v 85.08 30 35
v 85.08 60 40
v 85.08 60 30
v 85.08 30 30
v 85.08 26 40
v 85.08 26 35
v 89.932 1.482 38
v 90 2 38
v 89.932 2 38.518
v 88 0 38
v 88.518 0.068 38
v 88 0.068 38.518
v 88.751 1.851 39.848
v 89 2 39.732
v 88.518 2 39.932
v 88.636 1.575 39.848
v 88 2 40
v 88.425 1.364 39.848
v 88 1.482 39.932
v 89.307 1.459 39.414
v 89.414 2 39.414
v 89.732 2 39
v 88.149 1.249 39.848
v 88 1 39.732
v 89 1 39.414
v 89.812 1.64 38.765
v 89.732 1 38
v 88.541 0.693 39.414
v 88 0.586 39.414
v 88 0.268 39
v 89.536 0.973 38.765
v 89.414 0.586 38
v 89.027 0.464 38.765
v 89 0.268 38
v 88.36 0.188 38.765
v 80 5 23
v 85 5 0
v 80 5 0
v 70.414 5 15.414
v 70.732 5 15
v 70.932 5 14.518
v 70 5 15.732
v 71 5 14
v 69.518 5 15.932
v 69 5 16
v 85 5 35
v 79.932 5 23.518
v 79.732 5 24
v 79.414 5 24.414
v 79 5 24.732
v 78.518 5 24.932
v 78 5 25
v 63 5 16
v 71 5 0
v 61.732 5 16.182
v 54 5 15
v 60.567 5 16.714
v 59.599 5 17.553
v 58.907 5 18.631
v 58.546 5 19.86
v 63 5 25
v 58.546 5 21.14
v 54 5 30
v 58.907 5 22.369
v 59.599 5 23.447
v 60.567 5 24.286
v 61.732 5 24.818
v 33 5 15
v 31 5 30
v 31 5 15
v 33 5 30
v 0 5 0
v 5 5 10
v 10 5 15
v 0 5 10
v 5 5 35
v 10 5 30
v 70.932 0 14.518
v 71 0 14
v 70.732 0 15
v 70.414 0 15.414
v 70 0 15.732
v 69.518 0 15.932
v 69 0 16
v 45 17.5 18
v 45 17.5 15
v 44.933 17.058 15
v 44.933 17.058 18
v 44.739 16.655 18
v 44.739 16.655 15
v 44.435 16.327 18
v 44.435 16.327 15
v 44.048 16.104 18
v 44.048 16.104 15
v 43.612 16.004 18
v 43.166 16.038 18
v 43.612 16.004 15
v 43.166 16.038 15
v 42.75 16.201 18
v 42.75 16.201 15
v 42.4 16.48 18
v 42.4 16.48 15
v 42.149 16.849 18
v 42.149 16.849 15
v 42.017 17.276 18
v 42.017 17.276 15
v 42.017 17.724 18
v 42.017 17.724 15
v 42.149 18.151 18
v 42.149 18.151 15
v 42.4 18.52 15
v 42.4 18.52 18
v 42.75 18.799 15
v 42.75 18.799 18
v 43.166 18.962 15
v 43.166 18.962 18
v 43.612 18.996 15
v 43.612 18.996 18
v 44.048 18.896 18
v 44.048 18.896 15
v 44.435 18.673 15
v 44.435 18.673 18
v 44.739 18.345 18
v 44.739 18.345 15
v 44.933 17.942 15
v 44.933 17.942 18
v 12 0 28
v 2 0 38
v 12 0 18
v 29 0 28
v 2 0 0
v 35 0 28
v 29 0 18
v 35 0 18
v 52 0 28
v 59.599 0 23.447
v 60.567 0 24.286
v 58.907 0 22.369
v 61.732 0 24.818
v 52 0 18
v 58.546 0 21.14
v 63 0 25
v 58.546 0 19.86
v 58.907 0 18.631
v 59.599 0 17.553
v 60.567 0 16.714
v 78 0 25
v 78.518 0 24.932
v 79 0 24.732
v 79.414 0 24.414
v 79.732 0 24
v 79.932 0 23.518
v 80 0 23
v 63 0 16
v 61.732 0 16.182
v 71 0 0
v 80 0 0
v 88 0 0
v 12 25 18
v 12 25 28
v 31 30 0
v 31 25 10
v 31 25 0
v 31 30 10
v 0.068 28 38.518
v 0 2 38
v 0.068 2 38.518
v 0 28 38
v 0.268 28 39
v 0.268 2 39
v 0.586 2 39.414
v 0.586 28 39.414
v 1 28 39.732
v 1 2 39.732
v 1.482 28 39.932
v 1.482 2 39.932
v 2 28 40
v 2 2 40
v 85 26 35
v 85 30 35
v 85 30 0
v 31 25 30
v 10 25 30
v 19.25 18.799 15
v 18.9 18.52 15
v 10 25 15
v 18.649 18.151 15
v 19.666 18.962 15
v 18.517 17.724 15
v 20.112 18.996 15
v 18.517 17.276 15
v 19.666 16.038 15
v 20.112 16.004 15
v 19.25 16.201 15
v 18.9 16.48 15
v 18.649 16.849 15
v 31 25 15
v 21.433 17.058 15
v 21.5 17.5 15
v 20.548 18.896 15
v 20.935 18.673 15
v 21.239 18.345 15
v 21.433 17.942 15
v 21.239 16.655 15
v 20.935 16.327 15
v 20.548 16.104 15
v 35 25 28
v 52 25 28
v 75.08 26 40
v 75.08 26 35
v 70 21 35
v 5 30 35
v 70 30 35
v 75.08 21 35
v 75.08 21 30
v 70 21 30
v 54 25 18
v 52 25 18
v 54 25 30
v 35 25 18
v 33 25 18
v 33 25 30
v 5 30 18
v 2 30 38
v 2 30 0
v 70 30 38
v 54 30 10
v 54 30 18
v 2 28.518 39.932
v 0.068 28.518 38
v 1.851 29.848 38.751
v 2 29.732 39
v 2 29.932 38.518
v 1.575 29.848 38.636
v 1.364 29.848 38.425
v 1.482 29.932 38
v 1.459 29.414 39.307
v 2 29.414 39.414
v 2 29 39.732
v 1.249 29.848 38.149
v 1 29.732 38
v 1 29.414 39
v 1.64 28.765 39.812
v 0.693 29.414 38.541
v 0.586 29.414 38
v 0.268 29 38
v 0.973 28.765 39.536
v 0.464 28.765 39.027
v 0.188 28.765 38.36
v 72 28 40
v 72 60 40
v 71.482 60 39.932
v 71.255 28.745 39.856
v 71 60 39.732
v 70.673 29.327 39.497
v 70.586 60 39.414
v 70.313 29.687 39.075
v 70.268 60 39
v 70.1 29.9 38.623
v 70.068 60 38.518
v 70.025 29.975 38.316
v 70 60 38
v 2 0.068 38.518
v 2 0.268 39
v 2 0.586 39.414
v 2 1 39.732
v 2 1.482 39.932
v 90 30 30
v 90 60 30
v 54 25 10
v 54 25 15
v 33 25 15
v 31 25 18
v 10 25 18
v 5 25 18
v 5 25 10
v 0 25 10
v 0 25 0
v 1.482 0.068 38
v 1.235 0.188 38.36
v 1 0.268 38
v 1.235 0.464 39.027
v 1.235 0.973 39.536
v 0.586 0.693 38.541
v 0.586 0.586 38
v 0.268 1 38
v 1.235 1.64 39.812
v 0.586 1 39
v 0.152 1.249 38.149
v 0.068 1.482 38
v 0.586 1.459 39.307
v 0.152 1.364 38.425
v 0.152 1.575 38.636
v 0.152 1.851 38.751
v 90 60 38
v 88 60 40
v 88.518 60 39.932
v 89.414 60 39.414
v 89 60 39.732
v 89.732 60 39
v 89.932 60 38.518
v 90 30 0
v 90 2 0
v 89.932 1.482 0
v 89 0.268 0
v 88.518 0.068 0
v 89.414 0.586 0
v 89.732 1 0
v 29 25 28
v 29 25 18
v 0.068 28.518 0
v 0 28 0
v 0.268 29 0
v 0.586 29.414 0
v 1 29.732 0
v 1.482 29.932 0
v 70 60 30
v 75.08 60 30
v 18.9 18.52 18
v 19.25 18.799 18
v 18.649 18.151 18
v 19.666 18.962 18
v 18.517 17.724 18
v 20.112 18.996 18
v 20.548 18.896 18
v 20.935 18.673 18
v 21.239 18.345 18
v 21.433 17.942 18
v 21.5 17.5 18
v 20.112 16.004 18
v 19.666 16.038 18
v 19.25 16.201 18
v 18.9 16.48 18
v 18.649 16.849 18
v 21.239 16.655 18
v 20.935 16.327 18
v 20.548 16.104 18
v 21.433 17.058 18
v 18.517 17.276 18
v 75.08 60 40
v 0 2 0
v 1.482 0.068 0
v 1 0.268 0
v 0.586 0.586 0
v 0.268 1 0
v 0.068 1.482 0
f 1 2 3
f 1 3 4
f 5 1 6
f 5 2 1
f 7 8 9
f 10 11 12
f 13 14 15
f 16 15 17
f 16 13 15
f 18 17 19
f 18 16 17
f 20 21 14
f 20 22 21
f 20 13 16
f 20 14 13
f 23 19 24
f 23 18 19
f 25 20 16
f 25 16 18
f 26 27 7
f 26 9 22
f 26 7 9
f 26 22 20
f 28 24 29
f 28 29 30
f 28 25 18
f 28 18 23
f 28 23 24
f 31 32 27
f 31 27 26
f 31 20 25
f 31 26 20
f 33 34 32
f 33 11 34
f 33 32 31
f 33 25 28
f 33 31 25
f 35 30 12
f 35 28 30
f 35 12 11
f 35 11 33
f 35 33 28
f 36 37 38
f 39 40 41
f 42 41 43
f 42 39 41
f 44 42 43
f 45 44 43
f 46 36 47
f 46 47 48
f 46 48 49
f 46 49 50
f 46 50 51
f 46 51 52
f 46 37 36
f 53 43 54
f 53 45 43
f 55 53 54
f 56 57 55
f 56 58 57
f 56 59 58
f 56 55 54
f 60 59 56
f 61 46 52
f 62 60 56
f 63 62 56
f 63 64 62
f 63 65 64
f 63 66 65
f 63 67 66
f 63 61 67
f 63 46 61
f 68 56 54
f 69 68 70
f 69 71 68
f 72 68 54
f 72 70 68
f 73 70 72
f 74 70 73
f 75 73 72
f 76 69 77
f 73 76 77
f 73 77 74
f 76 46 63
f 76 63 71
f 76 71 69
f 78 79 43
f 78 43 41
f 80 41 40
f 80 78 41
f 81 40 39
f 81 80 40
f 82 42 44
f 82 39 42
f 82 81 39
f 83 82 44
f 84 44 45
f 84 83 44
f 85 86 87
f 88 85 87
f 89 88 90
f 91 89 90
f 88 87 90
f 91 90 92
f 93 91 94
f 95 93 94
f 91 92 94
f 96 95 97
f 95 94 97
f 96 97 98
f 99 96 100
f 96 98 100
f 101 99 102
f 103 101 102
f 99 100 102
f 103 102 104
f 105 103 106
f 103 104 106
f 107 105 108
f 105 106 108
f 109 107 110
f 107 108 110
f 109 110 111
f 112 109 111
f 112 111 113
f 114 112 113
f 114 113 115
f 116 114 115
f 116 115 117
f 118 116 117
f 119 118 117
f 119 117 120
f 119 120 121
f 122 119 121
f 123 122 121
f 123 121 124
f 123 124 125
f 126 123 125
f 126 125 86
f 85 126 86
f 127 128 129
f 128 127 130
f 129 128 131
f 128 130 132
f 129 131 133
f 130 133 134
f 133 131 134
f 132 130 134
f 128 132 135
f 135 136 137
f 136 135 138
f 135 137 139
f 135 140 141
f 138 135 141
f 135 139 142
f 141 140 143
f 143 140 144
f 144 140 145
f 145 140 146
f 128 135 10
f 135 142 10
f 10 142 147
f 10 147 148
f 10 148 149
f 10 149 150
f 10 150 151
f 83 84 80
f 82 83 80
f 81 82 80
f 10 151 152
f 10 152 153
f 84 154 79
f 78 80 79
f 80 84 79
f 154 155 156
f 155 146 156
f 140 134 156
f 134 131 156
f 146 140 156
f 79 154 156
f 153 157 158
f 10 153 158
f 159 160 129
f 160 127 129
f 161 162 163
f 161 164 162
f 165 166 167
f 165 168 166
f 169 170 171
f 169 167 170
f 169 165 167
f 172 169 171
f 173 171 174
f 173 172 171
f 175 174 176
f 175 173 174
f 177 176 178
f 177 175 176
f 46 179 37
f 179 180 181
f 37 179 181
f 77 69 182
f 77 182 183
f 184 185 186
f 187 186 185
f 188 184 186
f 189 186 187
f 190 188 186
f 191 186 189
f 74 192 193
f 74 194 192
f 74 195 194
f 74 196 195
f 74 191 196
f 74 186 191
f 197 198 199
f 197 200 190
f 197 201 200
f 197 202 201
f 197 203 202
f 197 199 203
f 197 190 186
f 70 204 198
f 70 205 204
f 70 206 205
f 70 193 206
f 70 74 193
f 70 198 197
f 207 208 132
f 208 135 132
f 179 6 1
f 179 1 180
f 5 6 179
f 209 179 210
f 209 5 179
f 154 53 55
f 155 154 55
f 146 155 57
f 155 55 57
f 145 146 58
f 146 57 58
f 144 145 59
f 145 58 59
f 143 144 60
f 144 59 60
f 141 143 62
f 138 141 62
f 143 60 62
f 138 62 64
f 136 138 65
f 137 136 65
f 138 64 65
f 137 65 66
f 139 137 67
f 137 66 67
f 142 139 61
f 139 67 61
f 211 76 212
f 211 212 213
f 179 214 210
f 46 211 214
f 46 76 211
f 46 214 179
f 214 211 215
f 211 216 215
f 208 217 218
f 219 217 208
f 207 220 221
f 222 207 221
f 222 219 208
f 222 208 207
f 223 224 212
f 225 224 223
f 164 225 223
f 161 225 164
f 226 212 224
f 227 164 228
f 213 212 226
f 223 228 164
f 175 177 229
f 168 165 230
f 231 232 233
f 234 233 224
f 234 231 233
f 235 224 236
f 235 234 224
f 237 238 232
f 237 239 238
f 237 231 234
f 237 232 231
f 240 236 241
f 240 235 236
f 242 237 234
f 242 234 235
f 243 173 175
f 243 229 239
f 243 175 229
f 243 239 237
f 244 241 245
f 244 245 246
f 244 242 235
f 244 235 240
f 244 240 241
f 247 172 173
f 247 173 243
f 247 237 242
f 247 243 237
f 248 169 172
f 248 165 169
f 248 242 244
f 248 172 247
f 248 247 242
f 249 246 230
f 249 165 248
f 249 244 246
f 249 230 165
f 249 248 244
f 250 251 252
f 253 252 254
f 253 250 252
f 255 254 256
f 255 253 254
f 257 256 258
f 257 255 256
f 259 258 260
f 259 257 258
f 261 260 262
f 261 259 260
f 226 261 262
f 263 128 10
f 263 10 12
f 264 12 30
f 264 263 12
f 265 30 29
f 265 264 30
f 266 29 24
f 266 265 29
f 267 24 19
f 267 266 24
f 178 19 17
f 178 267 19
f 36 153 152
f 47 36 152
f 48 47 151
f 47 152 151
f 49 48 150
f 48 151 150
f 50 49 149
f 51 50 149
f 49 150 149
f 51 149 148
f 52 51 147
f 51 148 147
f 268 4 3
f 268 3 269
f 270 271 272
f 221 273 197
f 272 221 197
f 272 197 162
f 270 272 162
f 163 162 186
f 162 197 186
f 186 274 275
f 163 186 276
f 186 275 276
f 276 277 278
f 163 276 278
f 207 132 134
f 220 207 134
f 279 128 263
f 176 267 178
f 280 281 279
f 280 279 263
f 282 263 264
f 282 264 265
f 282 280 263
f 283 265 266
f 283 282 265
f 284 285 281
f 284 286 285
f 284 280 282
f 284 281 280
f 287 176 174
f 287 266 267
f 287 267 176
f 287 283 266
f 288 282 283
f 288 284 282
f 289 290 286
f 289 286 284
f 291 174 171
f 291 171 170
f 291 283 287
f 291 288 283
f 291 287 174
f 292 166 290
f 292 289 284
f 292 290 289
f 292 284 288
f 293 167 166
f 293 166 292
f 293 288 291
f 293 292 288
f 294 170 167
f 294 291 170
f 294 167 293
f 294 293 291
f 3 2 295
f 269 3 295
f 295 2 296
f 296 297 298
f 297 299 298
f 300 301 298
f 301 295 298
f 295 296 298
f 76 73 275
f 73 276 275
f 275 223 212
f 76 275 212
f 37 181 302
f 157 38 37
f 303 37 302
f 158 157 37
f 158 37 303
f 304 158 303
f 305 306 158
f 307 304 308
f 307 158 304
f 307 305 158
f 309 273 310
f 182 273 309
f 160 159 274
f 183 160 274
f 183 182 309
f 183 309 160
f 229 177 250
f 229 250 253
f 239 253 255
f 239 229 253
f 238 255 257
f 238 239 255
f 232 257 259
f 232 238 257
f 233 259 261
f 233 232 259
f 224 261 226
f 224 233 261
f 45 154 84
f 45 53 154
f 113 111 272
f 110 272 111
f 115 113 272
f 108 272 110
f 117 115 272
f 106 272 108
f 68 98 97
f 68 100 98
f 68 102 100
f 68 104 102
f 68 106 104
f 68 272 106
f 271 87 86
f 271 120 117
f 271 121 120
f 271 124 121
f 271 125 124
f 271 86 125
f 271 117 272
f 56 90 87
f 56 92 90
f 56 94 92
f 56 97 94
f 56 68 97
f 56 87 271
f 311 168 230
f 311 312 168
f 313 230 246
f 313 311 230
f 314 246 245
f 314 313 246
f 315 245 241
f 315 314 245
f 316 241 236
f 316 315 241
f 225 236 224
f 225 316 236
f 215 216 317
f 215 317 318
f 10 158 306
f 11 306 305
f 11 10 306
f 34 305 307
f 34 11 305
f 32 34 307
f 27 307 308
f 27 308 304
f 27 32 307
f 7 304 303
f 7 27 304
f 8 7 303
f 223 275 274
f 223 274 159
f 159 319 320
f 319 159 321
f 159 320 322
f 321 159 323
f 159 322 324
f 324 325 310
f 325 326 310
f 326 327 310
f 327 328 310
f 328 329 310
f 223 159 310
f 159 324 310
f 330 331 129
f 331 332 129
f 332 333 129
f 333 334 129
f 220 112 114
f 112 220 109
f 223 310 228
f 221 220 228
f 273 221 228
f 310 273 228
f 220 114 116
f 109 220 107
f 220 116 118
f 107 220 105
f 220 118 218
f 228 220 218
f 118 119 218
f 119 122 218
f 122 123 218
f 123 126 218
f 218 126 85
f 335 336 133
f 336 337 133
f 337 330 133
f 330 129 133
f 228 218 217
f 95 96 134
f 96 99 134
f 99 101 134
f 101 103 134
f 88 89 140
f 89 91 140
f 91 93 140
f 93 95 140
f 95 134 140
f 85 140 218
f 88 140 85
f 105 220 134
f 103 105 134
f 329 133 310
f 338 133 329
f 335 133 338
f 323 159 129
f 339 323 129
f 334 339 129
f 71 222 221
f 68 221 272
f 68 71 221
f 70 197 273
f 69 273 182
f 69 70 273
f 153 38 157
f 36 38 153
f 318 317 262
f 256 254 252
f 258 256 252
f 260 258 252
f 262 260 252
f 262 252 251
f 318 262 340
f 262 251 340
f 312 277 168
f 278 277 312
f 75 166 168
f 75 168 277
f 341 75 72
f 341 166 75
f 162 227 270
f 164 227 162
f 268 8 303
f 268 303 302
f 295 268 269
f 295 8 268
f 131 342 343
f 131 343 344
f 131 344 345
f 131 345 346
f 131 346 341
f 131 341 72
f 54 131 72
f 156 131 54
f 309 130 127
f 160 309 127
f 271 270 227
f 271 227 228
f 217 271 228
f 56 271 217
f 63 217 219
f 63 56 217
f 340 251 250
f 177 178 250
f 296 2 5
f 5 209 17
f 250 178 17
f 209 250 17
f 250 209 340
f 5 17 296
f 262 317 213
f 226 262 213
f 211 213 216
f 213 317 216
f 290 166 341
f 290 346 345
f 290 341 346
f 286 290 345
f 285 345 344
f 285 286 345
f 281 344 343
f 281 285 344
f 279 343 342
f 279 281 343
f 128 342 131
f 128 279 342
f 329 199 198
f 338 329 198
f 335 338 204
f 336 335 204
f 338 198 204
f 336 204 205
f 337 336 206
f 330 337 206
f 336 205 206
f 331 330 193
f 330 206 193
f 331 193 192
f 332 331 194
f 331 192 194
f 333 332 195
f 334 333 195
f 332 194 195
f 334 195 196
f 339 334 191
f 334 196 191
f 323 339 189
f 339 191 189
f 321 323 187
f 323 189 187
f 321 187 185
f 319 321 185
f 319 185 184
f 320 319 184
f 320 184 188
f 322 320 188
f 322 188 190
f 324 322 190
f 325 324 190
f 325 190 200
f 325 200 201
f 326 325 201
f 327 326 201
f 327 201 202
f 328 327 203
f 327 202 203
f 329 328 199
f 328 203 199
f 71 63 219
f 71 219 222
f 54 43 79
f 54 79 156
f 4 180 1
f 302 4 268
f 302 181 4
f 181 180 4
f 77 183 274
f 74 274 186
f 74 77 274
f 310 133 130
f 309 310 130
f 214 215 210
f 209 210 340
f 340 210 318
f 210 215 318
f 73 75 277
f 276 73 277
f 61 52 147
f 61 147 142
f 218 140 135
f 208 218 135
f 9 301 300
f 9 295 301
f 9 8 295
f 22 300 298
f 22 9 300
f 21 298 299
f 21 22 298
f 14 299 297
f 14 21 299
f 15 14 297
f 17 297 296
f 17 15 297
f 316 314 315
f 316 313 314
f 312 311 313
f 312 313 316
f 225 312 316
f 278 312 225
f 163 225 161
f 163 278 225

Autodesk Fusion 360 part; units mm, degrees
sketch "Sketch1" plane through (0, 0, 0) normal (0, 1, 0) x (1, 0, 0)
  line L0 (0, 0) -> (90, 0)
  line L1 (90, 0) -> (90, -40)
  line L2 (90, -40) -> (0, -40)
  line L3 (0, -40) -> (0, 0)
  dimension "d1" = 90
  dimension "d2" = 40
extrude "Extrude1" add sketch "Sketch1" along normal blind 30
sketch "Sketch2" plane through (0, 30, 0) normal (0, 1, 0) x (-1, 0, 0)
  line L0 (0, 40) -> (-90, 40)
  line L1 (-90, 40) -> (-90, 0)
  line L2 (-90, 0) -> (0, 0)
  line L3 (0, 0) -> (0, 40)
  line L4 (-85, 0) -> (-5, 0)
  line L5 (-5, 0) -> (-5, 35)
  line L6 (-5, 35) -> (-85, 35)
  line L7 (-85, 35) -> (-85, 0)
extrude "Extrude2" cut sketch "Sketch2" against normal blind 25 contours L2 L4 L5 L6 L7
sketch "Sketch3" plane through (0, 0, 0) normal (-1, 0, 0) x (0, -1, 0)
  line L0 (0, 0) -> (0, 40)
  line L1 (0, 40) -> (-30, 40)
  line L2 (-30, 40) -> (-30, 0)
  line L3 (-30, 0) -> (0, 0)
  line L4 (-25, 0) -> (-5, 0)
  line L5 (-5, 0) -> (-5, 10)
  line L6 (-5, 10) -> (-25, 10)
  line L7 (-25, 10) -> (-25, 0)
extrude "Extrude3" cut sketch "Sketch3" against normal blind 5 contours L3 L4 L5 L6 L7
sketch "Sketch4" plane through (0, 30, 0) normal (0, 1, 0) x (-1, 0, 0)
  line L0 (-85, 0) -> (-85, 35)
  line L1 (-85, 35) -> (-5, 35)
  line L2 (-5, 35) -> (-5, 0)
  line L3 (-5, 0) -> (0, 0)
  line L4 (0, 0) -> (0, 40)
  line L5 (0, 40) -> (-90, 40)
  line L6 (-90, 40) -> (-90, 0)
  line L7 (-90, 0) -> (-85, 0)
  line L8 (-90, 40) -> (-70, 40)
  line L9 (-70, 40) -> (-70, 35)
  line L10 (-70, 35) -> (-90, 35)
  line L11 (-90, 35) -> (-90, 40)
extrude "Extrude4" add sketch "Sketch4" along normal blind 30 contours L1 L5 L6 L8 L9 L10 L11
sketch "Sketch5" plane through (0, 0, 40) normal (0, 0, 1) x (-1, 0, 0)
  line L0 (0, 0) -> (-90, 0)
  line L1 (-90, 0) -> (-90, -60)
  line L2 (-90, -60) -> (-70, -60)
  line L3 (-70, -60) -> (-70, -30)
  line L4 (-70, -30) -> (0, -30)
  line L5 (0, -30) -> (0, 0)
  line L6 (-75.0796, -60) -> (-85.0796, -60)
  line L7 (-85.0796, -60) -> (-85.0796, -26)
  line L8 (-85.0796, -26) -> (-75.0796, -26)
  line L9 (-75.0796, -26) -> (-75.0796, -60)
  dimension "d11" = 10
  dimension "d12" = 34
extrude "Extrude5" cut sketch "Sketch5" against normal blind 5 contours L2 L6 L7 L8 L9
sketch "Sketch6" plane through (0, 5, 0) normal (0, 1, 0) x (-1, 0, 0)
  line L0 (-85, 35) -> (-85, 0)
  line L1 (-85, 0) -> (0, 0)
  line L2 (0, 0) -> (0, 10)
  line L3 (0, 10) -> (-5, 10)
  line L4 (-5, 10) -> (-5, 35)
  line L5 (-5, 35) -> (-85, 35)
  line L6 (-80, 25) -> (-71, 25)
  line L7 (-71, 16) -> (-71, 0)
  line L8 (-71, 0) -> (-80, 0)
  line L9 (-80, 0) -> (-80, 25)
  line L10 (-80, 25) -> (-63, 25)
  line L11 (-63, 16) -> (-71, 16)
  line L12 (-80, 16) -> (-80, 25)
  line L13 (-50, 28) -> (-33, 28)
  line L14 (-33, 28) -> (-33, 18)
  line L15 (-33, 18) -> (-50, 18)
  line L16 (-50, 18) -> (-50, 28)
  arc A0 (-63, 16) -> (-63, 25) centre (-63, 20.5) ccw
  dimension "d15" = 9
  dimension "d16" = 17
extrude "Extrude6" cut sketch "Sketch6" against normal blind 5 contours L1 L6 L7 L8 L9 L10 L11 L12 A0
sketch "Sketch7" plane through (0, 5, 0) normal (0, 1, 0) x (-1, 0, 0)
  line L0 (-80, 0) -> (-80, 25)
  line L1 (-80, 25) -> (-63, 25)
  arc A0 (-63, 16) -> (-63, 25) centre (-63, 20.5) ccw
  line L2 (-63, 16) -> (-71, 16)
  line L3 (-71, 16) -> (-71, 0)
  line L4 (-71, 0) -> (0, 0)
  line L5 (0, 0) -> (0, 10)
  line L6 (0, 10) -> (-5, 10)
  line L7 (-5, 10) -> (-5, 35)
  line L8 (-5, 35) -> (-85, 35)
  line L9 (-85, 35) -> (-85, 0)
  line L10 (-85, 0) -> (-80, 0)
  line L11 (-12, 28) -> (-29, 28)
  line L12 (-29, 28) -> (-29, 18)
  line L13 (-29, 18) -> (-12, 18)
  line L14 (-12, 18) -> (-12, 28)
extrude "Extrude7" cut sketch "Sketch7" against normal blind 8 contours L11 L12 L13 L14
sketch "Sketch8" plane through (0, 5, 0) normal (0, 1, 0) x (-1, 0, 0)
  line L0 (-29, 28) -> (-12, 28)
  line L1 (-12, 28) -> (-12, 18)
  line L2 (-12, 18) -> (-29, 18)
  line L3 (-29, 18) -> (-29, 28)
  line L4 (-80, 0) -> (-80, 25)
  line L5 (-80, 25) -> (-63, 25)
  arc A0 (-63, 16) -> (-63, 25) centre (-63, 20.5) ccw
  line L6 (-63, 16) -> (-71, 16)
  line L7 (-71, 16) -> (-71, 0)
  line L8 (-71, 0) -> (0, 0)
  line L9 (0, 0) -> (0, 10)
  line L10 (0, 10) -> (-5, 10)
  line L11 (-5, 10) -> (-5, 35)
  line L12 (-5, 35) -> (-85, 35)
  line L13 (-85, 35) -> (-85, 0)
  line L14 (-85, 0) -> (-80, 0)
  line L15 (-35, 28) -> (-52, 28)
  line L16 (-52, 28) -> (-52, 18)
  line L17 (-52, 18) -> (-35, 18)
  line L18 (-35, 18) -> (-35, 28)
extrude "Extrude8" cut sketch "Sketch8" against normal blind 6 contours L15 L16 L17 L18
sketch "Sketch9" plane through (0, 5, 0) normal (0, 1, 0) x (-1, 0, 0)
  line L0 (-52, 28) -> (-35, 28)
  line L1 (-35, 28) -> (-35, 18)
  line L2 (-35, 18) -> (-52, 18)
  line L3 (-52, 18) -> (-52, 28)
  line L4 (-29, 28) -> (-12, 28)
  line L5 (-12, 28) -> (-12, 18)
  line L6 (-12, 18) -> (-29, 18)
  line L7 (-29, 18) -> (-29, 28)
  line L8 (-80, 0) -> (-80, 25)
  line L9 (-80, 25) -> (-63, 25)
  arc A0 (-63, 16) -> (-63, 25) centre (-63, 20.5) ccw
  line L10 (-63, 16) -> (-71, 16)
  line L11 (-71, 16) -> (-71, 0)
  line L12 (-71, 0) -> (0, 0)
  line L13 (0, 0) -> (0, 10)
  line L14 (0, 10) -> (-5, 10)
  line L15 (-5, 10) -> (-5, 35)
  line L16 (-5, 35) -> (-85, 35)
  line L17 (-85, 35) -> (-85, 0)
  line L18 (-85, 0) -> (-80, 0)
  line L19 (-54, 30) -> (-33, 30)
  line L20 (-33, 30) -> (-33, 15)
  line L21 (-33, 15) -> (-54, 15)
  line L22 (-54, 15) -> (-54, 30)
extrude "Extrude9" add sketch "Sketch9" along normal blind 20 contours L19 L20 L21 L22
sketch "Sketch10" plane through (0, 5, 0) normal (0, 1, 0) x (-1, 0, 0)
  line L0 (-54, 15) -> (-54, 30)
  line L1 (-54, 30) -> (-33, 30)
  line L2 (-33, 30) -> (-33, 15)
  line L3 (-33, 15) -> (-54, 15)
  line L4 (-29, 28) -> (-12, 28)
  line L5 (-12, 28) -> (-12, 18)
  line L6 (-12, 18) -> (-29, 18)
  line L7 (-29, 18) -> (-29, 28)
  line L8 (-80, 0) -> (-80, 25)
  line L9 (-80, 25) -> (-63, 25)
  arc A0 (-63, 16) -> (-63, 25) centre (-63, 20.5) ccw
  line L10 (-63, 16) -> (-71, 16)
  line L11 (-71, 16) -> (-71, 0)
  line L12 (-71, 0) -> (0, 0)
  line L13 (0, 0) -> (0, 10)
  line L14 (0, 10) -> (-5, 10)
  line L15 (-5, 10) -> (-5, 35)
  line L16 (-5, 35) -> (-85, 35)
  line L17 (-85, 35) -> (-85, 0)
  line L18 (-85, 0) -> (-80, 0)
  line L19 (-31, 30) -> (-10, 30)
  line L20 (-10, 30) -> (-10, 15)
  line L21 (-10, 15) -> (-31, 15)
  line L22 (-31, 15) -> (-31, 30)
extrude "Extrude10" add sketch "Sketch10" along normal blind 20 contours L19 L20 L21 L22
sketch "Sketch11" plane through (0, 0, 0) normal (-1, 0, 0) x (0, -1, 0)
  line L0 (-25, 0) -> (-25, 10)
  line L1 (-25, 10) -> (-5, 10)
  line L2 (-5, 10) -> (-5, 0)
  line L3 (-5, 0) -> (0, 0)
  line L4 (0, 0) -> (0, 40)
  line L5 (0, 40) -> (-30, 40)
  line L6 (-30, 40) -> (-30, 0)
  line L7 (-30, 0) -> (-25, 0)
  line L8 (-25, 0) -> (-30, 0)
  line L9 (-30, 0) -> (-30, 18)
  line L10 (-30, 18) -> (-25, 18)
  line L11 (-25, 18) -> (-25, 0)
  dimension "d27" = 18
extrude "Extrude11" add sketch "Sketch11" against normal blind 54 contours L0 L6 L7 L8 L9 L10 L11
sketch "Sketch12" plane through (0, 0, 15) normal (0, 0, -1) x (1, 0, 0)
  line L0 (54, -5) -> (33, -5)
  line L1 (33, -5) -> (33, -25)
  line L2 (33, -25) -> (54, -25)
  line L3 (54, -25) -> (54, -5)
  circle A0 centre (43.5, -17.5) radius 1.5
  circle A1 centre (20, -17.5) radius 1.5
  line L4 (54, -25) -> (0, -25)
  dimension "d30" = 7.5
  dimension "d31" = 3
  dimension "d32" = 7.5
  dimension "d33" = 3
extrude "Extrude12" cut sketch "Sketch12" against normal blind 4 contours A0
sketch "Sketch13" plane through (0, 0, 15) normal (0, 0, -1) x (1, 0, 0)
  line L0 (31, -5) -> (10, -5)
  line L1 (10, -5) -> (10, -25)
  line L2 (10, -25) -> (31, -25)
  line L3 (31, -25) -> (31, -5)
  circle A0 centre (20, -17.5) radius 1.5
  dimension "d36" = 7.5
  dimension "d37" = 3
  dimension "d38" = 11
extrude "Extrude13" cut sketch "Sketch13" against normal blind 4 contours A0
sketch "Sketch14" plane through (0, 30, 0) normal (0, 1, 0) x (-1, 0, 0)
  line L0 (0, 0) -> (0, 40)
  line L1 (0, 40) -> (-70, 40)
  line L2 (-70, 40) -> (-70, 35)
  line L3 (-70, 35) -> (-5, 35)
  line L4 (-5, 35) -> (-5, 18)
  line L5 (-5, 18) -> (-54, 18)
  line L6 (-54, 18) -> (-54, 0)
  line L7 (-54, 0) -> (0, 0)
  line L8 (-54, 10) -> (-31, 10)
  line L9 (-31, 10) -> (-31, 0)
  line L10 (-31, 0) -> (-54, 0)
  line L11 (-54, 0) -> (-54, 10)
  dimension "d41" = 10
extrude "Extrude14" cut sketch "Sketch14" against normal blind 5 contours L6 L7 L8 L9 L10 L11
sketch "Sketch15" plane through (0, 0, 35) normal (0, 0, -1) x (1, 0, 0)
  line L0 (75.0796, -26) -> (85, -26)
  line L1 (85, -26) -> (85, -5)
  line L2 (85, -5) -> (5, -5)
  line L3 (5, -5) -> (5, -30)
  line L4 (5, -30) -> (70, -30)
  line L5 (70, -30) -> (70, -60)
  line L6 (70, -60) -> (75.0796, -60)
  line L7 (75.0796, -60) -> (75.0796, -26)
  line L8 (75.0796, -26) -> (70, -26)
  line L9 (70, -26) -> (70, -60)
  line L10 (70, -60) -> (75.0796, -60)
  line L11 (75.0796, -60) -> (75.0796, -26)
extrude "Extrude15" add sketch "Sketch15" along normal blind 5 contours L5 L6 L7 L8 L9 L10 L11
extrude "Extrude16" add 1 faces at (88.3599, 50, 35) along direction (0, 0, -1) blind 5
sketch "Sketch16" plane through (0, 60, 0) normal (0, 1, 0) x (-1, 0, 0)
  line L0 (-85.0796, 30) -> (-85.0796, 40)
  line L1 (-85.0796, 40) -> (-90, 40)
  line L2 (-90, 40) -> (-90, 30)
  line L3 (-90, 30) -> (-85.0796, 30)
sketch "Sketch17" plane through (0, 0, 30) normal (0, 0, -1) x (1, 0, 0)
  line L0 (75.0796, -60) -> (75.0796, -26)
  line L1 (75.0796, -26) -> (70, -26)
  line L2 (70, -26) -> (70, -60)
  line L3 (70, -60) -> (75.0796, -60)
  line L4 (75.0796, -26) -> (70, -26)
  line L5 (70, -26) -> (70, -21)
  line L6 (70, -21) -> (75.0796, -21)
  line L7 (75.0796, -21) -> (75.0796, -26)
extrude "Extrude17" add sketch "Sketch17" against normal blind 5 contours L1 L4 L5 L6 L7
fillet "Fillet1" radius 2 1 edges at (90, 0, 20)
fillet "Fillet2" radius 2 3 edges at (90, 31, 40) (89.4142, 0.5858, 40) (44, 0, 40)
fillet "Fillet3" radius 2 3 edges at (0, 16, 40) (0, 0.5858, 39.4142) (0, 0, 19)
fillet "Fillet4" radius 2 3 edges at (0, 30, 19) (0.5858, 30, 39.4142) (36, 30, 40)
fillet "Fillet5" radius 2 1 edges at (70, 44, 40)
fillet "Fillet6" radius 2 1 edges at (80, 2.5, 25)
fillet "Fillet7" radius 2 1 edges at (71, 2.5, 16)
